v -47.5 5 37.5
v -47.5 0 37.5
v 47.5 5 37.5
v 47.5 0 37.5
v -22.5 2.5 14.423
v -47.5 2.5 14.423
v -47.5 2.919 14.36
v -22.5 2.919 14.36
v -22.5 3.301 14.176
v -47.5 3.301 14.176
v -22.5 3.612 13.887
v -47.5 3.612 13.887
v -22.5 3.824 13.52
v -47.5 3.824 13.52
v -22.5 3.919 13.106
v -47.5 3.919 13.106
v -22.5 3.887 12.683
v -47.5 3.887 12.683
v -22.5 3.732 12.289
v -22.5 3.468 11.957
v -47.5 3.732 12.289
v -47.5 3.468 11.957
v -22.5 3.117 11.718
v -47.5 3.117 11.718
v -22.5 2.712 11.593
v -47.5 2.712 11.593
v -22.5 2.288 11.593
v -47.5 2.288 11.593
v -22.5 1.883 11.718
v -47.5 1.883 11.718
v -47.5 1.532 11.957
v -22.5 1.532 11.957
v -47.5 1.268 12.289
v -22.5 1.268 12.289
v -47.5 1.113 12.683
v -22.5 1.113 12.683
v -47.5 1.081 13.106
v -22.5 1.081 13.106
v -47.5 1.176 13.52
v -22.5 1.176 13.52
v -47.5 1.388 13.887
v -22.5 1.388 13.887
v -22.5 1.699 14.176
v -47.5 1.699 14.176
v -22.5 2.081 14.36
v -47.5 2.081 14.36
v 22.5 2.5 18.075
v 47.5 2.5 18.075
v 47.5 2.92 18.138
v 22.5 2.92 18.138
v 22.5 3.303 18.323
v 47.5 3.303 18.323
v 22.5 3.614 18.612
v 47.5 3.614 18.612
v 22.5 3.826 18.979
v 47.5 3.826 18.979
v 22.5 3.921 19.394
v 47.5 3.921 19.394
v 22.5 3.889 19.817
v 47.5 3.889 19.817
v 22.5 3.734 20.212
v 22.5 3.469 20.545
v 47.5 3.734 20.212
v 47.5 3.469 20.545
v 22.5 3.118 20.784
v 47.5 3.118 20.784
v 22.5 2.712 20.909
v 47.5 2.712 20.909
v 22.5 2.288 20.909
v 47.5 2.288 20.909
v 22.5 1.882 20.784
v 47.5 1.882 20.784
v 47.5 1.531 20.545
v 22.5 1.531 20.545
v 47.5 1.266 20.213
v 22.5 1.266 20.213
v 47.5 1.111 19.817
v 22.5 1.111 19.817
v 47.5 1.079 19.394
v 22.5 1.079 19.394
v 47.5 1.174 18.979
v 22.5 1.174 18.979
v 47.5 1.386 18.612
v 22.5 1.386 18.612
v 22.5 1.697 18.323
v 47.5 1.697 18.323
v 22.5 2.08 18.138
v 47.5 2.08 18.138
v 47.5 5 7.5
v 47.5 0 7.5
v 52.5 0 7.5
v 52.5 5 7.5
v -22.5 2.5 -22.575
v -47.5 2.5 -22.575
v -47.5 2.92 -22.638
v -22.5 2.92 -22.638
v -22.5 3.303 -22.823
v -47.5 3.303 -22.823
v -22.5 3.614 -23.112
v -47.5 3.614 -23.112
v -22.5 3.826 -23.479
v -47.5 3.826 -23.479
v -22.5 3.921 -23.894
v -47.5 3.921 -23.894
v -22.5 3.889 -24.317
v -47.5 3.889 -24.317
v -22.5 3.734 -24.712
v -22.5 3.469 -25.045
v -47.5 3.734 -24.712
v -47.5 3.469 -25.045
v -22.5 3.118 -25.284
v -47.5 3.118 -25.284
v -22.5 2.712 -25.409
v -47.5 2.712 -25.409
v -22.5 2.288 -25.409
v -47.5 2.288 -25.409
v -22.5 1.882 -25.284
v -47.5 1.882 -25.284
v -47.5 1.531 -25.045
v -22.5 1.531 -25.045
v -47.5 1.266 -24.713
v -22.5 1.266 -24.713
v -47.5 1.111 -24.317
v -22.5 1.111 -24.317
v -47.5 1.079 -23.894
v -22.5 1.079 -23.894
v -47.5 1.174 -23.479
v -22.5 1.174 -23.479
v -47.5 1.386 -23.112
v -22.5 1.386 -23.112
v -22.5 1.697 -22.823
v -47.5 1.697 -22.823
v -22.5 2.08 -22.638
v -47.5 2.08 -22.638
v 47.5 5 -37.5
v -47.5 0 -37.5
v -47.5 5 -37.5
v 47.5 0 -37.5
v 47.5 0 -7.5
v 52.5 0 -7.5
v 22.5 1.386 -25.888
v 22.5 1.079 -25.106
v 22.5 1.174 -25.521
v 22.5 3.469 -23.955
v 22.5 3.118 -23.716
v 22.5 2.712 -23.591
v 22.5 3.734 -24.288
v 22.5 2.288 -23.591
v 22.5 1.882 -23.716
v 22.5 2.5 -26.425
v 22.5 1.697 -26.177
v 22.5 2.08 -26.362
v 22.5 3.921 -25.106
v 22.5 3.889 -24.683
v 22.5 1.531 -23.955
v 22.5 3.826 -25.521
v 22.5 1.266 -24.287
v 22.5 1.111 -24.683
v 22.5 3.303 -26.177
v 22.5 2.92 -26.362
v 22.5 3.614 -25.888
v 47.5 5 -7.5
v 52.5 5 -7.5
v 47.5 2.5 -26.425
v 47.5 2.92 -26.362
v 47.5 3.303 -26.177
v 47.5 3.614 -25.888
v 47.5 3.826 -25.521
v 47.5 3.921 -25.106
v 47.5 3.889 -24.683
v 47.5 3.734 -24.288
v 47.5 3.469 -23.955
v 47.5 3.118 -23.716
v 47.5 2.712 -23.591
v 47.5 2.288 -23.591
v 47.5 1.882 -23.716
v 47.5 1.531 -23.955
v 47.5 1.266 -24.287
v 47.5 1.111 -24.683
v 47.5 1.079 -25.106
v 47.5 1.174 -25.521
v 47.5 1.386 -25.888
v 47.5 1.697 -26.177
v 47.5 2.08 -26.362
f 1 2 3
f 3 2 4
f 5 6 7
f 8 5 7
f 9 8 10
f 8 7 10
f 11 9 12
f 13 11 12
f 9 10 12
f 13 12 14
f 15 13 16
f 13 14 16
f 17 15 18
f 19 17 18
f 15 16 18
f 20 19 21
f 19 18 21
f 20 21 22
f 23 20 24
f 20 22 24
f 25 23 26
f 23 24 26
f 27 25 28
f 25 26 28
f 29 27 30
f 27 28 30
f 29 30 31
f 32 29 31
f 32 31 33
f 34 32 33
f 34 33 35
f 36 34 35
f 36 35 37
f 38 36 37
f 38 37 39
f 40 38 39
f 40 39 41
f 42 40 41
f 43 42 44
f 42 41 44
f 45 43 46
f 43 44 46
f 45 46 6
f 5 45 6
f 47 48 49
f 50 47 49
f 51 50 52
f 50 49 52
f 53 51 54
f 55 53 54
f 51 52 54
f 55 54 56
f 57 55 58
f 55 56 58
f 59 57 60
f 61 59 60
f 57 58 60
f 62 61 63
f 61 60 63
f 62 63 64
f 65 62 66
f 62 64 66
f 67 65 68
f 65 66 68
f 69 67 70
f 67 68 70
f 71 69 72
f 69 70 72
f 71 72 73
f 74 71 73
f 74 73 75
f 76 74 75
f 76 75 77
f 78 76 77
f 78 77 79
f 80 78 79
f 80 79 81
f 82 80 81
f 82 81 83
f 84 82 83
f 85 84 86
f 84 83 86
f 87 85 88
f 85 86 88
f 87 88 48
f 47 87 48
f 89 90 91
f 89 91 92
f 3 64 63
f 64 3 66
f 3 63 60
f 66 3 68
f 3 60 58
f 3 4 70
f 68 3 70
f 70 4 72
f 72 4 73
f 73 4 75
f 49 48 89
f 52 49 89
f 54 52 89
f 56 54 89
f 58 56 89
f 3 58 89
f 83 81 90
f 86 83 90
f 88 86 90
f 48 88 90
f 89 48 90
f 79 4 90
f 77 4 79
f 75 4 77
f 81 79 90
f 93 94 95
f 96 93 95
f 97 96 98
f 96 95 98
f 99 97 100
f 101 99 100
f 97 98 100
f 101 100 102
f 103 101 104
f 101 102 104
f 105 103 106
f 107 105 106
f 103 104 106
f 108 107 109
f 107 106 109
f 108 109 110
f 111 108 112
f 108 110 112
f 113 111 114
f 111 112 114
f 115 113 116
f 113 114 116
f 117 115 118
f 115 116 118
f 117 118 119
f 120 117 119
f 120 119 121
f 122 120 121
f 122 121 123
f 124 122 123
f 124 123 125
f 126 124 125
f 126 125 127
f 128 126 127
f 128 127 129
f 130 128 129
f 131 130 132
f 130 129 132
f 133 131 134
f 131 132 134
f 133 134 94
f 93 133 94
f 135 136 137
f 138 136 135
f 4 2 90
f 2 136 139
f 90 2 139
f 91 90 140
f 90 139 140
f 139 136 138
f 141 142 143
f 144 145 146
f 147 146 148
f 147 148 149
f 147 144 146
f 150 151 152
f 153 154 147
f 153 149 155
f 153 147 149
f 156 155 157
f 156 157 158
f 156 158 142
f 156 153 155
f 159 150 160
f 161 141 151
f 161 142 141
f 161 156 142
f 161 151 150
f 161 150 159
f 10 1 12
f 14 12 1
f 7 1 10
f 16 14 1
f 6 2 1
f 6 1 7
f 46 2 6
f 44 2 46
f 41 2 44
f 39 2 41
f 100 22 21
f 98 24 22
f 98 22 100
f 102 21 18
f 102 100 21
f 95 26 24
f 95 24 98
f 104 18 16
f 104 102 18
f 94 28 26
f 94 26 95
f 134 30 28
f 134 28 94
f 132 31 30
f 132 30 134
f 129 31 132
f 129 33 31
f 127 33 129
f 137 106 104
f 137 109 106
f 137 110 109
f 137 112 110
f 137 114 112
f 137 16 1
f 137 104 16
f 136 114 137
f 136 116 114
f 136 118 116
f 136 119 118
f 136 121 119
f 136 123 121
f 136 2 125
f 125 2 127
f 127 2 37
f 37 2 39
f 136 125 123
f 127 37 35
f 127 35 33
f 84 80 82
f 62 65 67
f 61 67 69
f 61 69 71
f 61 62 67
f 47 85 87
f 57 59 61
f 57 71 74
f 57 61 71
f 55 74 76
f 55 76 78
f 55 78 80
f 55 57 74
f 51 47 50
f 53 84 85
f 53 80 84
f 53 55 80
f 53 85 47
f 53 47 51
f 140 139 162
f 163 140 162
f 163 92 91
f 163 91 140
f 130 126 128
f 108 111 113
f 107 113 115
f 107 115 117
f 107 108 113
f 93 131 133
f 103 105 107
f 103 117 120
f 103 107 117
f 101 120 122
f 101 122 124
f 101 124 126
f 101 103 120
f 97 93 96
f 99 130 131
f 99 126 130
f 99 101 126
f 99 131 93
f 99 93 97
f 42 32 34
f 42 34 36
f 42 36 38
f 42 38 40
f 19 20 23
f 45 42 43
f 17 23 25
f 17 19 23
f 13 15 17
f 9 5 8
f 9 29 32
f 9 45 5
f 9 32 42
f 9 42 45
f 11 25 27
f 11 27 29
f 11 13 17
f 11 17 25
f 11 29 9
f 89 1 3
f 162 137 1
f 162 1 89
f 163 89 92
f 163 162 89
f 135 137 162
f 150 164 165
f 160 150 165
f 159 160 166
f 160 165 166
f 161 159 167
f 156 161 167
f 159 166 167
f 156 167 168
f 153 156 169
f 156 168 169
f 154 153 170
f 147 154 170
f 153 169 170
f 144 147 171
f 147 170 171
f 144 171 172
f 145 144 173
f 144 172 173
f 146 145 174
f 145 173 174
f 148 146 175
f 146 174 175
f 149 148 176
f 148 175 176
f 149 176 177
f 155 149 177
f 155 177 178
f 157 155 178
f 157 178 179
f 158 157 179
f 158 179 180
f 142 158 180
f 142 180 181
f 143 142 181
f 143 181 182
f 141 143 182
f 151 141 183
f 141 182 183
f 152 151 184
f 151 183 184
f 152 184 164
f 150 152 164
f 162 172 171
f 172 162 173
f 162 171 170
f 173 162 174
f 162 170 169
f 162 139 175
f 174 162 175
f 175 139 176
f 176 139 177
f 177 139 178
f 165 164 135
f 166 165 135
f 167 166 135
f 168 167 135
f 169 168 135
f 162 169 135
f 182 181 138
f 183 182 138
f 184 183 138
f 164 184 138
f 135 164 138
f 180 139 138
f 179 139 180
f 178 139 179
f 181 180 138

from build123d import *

# Parameters (mm, degrees)
SKETCH1_W           = 95
SKETCH1_H           = 75
BOSS_EXTRUDE1_DEPTH = 5
SKETCH3_W           = 15
SKETCH3_H           = 5
BOSS_EXTRUDE2_DEPTH = 5
SKETCH4_R           = 1.425
SKETCH4_R_2         = 1.422731811
CUT_EXTRUDE1_DEPTH  = 25
SKETCH5_R           = 1.425
CUT_EXTRUDE2_DEPTH  = 25
SKETCH6_R           = 1.425
CUT_EXTRUDE3_DEPTH  = 25


with BuildPart() as part:
    # Sketch1 → Boss-Extrude1 (new body)
    with BuildSketch(Plane(origin=(0, 0, 0), x_dir=(1, 0, 0), z_dir=(0, 1, 0))):
        Rectangle(SKETCH1_W, SKETCH1_H)
    extrude(amount=BOSS_EXTRUDE1_DEPTH)

    # Sketch3 → Boss-Extrude2 (add)
    with BuildSketch(Plane(origin=(47.5, 0, 0), x_dir=(0, 0, -1), z_dir=(1, 0, 0))):
        with Locations((0, 2.5)):
            Rectangle(SKETCH3_W, SKETCH3_H)
    extrude(amount=BOSS_EXTRUDE2_DEPTH)

    # Sketch4 → Cut-Extrude1 (cut)
    with BuildSketch(Plane.ZY.offset(47.5)):
        with Locations((-24, 2.5)):
            Circle(SKETCH4_R)
        with Locations((13, 2.5)):
            Circle(SKETCH4_R_2)
    extrude(amount=-CUT_EXTRUDE1_DEPTH, mode=Mode.SUBTRACT)

    # Sketch5 → Cut-Extrude2 (cut)
    with BuildSketch(Plane(origin=(47.5, 0, 0), x_dir=(0, 0, -1), z_dir=(1, 0, 0))):
        with Locations((-19.5, 2.5)):
            Circle(SKETCH5_R)
    extrude(amount=-CUT_EXTRUDE2_DEPTH, mode=Mode.SUBTRACT)

    # Sketch6 → Cut-Extrude3 (cut)
    with BuildSketch(Plane(origin=(47.5, 0, 0), x_dir=(0, 0, -1), z_dir=(1, 0, 0))):
        with Locations((25, 2.5)):
            Circle(SKETCH6_R)
    extrude(amount=-CUT_EXTRUDE3_DEPTH, mode=Mode.SUBTRACT)


solid = part.part
